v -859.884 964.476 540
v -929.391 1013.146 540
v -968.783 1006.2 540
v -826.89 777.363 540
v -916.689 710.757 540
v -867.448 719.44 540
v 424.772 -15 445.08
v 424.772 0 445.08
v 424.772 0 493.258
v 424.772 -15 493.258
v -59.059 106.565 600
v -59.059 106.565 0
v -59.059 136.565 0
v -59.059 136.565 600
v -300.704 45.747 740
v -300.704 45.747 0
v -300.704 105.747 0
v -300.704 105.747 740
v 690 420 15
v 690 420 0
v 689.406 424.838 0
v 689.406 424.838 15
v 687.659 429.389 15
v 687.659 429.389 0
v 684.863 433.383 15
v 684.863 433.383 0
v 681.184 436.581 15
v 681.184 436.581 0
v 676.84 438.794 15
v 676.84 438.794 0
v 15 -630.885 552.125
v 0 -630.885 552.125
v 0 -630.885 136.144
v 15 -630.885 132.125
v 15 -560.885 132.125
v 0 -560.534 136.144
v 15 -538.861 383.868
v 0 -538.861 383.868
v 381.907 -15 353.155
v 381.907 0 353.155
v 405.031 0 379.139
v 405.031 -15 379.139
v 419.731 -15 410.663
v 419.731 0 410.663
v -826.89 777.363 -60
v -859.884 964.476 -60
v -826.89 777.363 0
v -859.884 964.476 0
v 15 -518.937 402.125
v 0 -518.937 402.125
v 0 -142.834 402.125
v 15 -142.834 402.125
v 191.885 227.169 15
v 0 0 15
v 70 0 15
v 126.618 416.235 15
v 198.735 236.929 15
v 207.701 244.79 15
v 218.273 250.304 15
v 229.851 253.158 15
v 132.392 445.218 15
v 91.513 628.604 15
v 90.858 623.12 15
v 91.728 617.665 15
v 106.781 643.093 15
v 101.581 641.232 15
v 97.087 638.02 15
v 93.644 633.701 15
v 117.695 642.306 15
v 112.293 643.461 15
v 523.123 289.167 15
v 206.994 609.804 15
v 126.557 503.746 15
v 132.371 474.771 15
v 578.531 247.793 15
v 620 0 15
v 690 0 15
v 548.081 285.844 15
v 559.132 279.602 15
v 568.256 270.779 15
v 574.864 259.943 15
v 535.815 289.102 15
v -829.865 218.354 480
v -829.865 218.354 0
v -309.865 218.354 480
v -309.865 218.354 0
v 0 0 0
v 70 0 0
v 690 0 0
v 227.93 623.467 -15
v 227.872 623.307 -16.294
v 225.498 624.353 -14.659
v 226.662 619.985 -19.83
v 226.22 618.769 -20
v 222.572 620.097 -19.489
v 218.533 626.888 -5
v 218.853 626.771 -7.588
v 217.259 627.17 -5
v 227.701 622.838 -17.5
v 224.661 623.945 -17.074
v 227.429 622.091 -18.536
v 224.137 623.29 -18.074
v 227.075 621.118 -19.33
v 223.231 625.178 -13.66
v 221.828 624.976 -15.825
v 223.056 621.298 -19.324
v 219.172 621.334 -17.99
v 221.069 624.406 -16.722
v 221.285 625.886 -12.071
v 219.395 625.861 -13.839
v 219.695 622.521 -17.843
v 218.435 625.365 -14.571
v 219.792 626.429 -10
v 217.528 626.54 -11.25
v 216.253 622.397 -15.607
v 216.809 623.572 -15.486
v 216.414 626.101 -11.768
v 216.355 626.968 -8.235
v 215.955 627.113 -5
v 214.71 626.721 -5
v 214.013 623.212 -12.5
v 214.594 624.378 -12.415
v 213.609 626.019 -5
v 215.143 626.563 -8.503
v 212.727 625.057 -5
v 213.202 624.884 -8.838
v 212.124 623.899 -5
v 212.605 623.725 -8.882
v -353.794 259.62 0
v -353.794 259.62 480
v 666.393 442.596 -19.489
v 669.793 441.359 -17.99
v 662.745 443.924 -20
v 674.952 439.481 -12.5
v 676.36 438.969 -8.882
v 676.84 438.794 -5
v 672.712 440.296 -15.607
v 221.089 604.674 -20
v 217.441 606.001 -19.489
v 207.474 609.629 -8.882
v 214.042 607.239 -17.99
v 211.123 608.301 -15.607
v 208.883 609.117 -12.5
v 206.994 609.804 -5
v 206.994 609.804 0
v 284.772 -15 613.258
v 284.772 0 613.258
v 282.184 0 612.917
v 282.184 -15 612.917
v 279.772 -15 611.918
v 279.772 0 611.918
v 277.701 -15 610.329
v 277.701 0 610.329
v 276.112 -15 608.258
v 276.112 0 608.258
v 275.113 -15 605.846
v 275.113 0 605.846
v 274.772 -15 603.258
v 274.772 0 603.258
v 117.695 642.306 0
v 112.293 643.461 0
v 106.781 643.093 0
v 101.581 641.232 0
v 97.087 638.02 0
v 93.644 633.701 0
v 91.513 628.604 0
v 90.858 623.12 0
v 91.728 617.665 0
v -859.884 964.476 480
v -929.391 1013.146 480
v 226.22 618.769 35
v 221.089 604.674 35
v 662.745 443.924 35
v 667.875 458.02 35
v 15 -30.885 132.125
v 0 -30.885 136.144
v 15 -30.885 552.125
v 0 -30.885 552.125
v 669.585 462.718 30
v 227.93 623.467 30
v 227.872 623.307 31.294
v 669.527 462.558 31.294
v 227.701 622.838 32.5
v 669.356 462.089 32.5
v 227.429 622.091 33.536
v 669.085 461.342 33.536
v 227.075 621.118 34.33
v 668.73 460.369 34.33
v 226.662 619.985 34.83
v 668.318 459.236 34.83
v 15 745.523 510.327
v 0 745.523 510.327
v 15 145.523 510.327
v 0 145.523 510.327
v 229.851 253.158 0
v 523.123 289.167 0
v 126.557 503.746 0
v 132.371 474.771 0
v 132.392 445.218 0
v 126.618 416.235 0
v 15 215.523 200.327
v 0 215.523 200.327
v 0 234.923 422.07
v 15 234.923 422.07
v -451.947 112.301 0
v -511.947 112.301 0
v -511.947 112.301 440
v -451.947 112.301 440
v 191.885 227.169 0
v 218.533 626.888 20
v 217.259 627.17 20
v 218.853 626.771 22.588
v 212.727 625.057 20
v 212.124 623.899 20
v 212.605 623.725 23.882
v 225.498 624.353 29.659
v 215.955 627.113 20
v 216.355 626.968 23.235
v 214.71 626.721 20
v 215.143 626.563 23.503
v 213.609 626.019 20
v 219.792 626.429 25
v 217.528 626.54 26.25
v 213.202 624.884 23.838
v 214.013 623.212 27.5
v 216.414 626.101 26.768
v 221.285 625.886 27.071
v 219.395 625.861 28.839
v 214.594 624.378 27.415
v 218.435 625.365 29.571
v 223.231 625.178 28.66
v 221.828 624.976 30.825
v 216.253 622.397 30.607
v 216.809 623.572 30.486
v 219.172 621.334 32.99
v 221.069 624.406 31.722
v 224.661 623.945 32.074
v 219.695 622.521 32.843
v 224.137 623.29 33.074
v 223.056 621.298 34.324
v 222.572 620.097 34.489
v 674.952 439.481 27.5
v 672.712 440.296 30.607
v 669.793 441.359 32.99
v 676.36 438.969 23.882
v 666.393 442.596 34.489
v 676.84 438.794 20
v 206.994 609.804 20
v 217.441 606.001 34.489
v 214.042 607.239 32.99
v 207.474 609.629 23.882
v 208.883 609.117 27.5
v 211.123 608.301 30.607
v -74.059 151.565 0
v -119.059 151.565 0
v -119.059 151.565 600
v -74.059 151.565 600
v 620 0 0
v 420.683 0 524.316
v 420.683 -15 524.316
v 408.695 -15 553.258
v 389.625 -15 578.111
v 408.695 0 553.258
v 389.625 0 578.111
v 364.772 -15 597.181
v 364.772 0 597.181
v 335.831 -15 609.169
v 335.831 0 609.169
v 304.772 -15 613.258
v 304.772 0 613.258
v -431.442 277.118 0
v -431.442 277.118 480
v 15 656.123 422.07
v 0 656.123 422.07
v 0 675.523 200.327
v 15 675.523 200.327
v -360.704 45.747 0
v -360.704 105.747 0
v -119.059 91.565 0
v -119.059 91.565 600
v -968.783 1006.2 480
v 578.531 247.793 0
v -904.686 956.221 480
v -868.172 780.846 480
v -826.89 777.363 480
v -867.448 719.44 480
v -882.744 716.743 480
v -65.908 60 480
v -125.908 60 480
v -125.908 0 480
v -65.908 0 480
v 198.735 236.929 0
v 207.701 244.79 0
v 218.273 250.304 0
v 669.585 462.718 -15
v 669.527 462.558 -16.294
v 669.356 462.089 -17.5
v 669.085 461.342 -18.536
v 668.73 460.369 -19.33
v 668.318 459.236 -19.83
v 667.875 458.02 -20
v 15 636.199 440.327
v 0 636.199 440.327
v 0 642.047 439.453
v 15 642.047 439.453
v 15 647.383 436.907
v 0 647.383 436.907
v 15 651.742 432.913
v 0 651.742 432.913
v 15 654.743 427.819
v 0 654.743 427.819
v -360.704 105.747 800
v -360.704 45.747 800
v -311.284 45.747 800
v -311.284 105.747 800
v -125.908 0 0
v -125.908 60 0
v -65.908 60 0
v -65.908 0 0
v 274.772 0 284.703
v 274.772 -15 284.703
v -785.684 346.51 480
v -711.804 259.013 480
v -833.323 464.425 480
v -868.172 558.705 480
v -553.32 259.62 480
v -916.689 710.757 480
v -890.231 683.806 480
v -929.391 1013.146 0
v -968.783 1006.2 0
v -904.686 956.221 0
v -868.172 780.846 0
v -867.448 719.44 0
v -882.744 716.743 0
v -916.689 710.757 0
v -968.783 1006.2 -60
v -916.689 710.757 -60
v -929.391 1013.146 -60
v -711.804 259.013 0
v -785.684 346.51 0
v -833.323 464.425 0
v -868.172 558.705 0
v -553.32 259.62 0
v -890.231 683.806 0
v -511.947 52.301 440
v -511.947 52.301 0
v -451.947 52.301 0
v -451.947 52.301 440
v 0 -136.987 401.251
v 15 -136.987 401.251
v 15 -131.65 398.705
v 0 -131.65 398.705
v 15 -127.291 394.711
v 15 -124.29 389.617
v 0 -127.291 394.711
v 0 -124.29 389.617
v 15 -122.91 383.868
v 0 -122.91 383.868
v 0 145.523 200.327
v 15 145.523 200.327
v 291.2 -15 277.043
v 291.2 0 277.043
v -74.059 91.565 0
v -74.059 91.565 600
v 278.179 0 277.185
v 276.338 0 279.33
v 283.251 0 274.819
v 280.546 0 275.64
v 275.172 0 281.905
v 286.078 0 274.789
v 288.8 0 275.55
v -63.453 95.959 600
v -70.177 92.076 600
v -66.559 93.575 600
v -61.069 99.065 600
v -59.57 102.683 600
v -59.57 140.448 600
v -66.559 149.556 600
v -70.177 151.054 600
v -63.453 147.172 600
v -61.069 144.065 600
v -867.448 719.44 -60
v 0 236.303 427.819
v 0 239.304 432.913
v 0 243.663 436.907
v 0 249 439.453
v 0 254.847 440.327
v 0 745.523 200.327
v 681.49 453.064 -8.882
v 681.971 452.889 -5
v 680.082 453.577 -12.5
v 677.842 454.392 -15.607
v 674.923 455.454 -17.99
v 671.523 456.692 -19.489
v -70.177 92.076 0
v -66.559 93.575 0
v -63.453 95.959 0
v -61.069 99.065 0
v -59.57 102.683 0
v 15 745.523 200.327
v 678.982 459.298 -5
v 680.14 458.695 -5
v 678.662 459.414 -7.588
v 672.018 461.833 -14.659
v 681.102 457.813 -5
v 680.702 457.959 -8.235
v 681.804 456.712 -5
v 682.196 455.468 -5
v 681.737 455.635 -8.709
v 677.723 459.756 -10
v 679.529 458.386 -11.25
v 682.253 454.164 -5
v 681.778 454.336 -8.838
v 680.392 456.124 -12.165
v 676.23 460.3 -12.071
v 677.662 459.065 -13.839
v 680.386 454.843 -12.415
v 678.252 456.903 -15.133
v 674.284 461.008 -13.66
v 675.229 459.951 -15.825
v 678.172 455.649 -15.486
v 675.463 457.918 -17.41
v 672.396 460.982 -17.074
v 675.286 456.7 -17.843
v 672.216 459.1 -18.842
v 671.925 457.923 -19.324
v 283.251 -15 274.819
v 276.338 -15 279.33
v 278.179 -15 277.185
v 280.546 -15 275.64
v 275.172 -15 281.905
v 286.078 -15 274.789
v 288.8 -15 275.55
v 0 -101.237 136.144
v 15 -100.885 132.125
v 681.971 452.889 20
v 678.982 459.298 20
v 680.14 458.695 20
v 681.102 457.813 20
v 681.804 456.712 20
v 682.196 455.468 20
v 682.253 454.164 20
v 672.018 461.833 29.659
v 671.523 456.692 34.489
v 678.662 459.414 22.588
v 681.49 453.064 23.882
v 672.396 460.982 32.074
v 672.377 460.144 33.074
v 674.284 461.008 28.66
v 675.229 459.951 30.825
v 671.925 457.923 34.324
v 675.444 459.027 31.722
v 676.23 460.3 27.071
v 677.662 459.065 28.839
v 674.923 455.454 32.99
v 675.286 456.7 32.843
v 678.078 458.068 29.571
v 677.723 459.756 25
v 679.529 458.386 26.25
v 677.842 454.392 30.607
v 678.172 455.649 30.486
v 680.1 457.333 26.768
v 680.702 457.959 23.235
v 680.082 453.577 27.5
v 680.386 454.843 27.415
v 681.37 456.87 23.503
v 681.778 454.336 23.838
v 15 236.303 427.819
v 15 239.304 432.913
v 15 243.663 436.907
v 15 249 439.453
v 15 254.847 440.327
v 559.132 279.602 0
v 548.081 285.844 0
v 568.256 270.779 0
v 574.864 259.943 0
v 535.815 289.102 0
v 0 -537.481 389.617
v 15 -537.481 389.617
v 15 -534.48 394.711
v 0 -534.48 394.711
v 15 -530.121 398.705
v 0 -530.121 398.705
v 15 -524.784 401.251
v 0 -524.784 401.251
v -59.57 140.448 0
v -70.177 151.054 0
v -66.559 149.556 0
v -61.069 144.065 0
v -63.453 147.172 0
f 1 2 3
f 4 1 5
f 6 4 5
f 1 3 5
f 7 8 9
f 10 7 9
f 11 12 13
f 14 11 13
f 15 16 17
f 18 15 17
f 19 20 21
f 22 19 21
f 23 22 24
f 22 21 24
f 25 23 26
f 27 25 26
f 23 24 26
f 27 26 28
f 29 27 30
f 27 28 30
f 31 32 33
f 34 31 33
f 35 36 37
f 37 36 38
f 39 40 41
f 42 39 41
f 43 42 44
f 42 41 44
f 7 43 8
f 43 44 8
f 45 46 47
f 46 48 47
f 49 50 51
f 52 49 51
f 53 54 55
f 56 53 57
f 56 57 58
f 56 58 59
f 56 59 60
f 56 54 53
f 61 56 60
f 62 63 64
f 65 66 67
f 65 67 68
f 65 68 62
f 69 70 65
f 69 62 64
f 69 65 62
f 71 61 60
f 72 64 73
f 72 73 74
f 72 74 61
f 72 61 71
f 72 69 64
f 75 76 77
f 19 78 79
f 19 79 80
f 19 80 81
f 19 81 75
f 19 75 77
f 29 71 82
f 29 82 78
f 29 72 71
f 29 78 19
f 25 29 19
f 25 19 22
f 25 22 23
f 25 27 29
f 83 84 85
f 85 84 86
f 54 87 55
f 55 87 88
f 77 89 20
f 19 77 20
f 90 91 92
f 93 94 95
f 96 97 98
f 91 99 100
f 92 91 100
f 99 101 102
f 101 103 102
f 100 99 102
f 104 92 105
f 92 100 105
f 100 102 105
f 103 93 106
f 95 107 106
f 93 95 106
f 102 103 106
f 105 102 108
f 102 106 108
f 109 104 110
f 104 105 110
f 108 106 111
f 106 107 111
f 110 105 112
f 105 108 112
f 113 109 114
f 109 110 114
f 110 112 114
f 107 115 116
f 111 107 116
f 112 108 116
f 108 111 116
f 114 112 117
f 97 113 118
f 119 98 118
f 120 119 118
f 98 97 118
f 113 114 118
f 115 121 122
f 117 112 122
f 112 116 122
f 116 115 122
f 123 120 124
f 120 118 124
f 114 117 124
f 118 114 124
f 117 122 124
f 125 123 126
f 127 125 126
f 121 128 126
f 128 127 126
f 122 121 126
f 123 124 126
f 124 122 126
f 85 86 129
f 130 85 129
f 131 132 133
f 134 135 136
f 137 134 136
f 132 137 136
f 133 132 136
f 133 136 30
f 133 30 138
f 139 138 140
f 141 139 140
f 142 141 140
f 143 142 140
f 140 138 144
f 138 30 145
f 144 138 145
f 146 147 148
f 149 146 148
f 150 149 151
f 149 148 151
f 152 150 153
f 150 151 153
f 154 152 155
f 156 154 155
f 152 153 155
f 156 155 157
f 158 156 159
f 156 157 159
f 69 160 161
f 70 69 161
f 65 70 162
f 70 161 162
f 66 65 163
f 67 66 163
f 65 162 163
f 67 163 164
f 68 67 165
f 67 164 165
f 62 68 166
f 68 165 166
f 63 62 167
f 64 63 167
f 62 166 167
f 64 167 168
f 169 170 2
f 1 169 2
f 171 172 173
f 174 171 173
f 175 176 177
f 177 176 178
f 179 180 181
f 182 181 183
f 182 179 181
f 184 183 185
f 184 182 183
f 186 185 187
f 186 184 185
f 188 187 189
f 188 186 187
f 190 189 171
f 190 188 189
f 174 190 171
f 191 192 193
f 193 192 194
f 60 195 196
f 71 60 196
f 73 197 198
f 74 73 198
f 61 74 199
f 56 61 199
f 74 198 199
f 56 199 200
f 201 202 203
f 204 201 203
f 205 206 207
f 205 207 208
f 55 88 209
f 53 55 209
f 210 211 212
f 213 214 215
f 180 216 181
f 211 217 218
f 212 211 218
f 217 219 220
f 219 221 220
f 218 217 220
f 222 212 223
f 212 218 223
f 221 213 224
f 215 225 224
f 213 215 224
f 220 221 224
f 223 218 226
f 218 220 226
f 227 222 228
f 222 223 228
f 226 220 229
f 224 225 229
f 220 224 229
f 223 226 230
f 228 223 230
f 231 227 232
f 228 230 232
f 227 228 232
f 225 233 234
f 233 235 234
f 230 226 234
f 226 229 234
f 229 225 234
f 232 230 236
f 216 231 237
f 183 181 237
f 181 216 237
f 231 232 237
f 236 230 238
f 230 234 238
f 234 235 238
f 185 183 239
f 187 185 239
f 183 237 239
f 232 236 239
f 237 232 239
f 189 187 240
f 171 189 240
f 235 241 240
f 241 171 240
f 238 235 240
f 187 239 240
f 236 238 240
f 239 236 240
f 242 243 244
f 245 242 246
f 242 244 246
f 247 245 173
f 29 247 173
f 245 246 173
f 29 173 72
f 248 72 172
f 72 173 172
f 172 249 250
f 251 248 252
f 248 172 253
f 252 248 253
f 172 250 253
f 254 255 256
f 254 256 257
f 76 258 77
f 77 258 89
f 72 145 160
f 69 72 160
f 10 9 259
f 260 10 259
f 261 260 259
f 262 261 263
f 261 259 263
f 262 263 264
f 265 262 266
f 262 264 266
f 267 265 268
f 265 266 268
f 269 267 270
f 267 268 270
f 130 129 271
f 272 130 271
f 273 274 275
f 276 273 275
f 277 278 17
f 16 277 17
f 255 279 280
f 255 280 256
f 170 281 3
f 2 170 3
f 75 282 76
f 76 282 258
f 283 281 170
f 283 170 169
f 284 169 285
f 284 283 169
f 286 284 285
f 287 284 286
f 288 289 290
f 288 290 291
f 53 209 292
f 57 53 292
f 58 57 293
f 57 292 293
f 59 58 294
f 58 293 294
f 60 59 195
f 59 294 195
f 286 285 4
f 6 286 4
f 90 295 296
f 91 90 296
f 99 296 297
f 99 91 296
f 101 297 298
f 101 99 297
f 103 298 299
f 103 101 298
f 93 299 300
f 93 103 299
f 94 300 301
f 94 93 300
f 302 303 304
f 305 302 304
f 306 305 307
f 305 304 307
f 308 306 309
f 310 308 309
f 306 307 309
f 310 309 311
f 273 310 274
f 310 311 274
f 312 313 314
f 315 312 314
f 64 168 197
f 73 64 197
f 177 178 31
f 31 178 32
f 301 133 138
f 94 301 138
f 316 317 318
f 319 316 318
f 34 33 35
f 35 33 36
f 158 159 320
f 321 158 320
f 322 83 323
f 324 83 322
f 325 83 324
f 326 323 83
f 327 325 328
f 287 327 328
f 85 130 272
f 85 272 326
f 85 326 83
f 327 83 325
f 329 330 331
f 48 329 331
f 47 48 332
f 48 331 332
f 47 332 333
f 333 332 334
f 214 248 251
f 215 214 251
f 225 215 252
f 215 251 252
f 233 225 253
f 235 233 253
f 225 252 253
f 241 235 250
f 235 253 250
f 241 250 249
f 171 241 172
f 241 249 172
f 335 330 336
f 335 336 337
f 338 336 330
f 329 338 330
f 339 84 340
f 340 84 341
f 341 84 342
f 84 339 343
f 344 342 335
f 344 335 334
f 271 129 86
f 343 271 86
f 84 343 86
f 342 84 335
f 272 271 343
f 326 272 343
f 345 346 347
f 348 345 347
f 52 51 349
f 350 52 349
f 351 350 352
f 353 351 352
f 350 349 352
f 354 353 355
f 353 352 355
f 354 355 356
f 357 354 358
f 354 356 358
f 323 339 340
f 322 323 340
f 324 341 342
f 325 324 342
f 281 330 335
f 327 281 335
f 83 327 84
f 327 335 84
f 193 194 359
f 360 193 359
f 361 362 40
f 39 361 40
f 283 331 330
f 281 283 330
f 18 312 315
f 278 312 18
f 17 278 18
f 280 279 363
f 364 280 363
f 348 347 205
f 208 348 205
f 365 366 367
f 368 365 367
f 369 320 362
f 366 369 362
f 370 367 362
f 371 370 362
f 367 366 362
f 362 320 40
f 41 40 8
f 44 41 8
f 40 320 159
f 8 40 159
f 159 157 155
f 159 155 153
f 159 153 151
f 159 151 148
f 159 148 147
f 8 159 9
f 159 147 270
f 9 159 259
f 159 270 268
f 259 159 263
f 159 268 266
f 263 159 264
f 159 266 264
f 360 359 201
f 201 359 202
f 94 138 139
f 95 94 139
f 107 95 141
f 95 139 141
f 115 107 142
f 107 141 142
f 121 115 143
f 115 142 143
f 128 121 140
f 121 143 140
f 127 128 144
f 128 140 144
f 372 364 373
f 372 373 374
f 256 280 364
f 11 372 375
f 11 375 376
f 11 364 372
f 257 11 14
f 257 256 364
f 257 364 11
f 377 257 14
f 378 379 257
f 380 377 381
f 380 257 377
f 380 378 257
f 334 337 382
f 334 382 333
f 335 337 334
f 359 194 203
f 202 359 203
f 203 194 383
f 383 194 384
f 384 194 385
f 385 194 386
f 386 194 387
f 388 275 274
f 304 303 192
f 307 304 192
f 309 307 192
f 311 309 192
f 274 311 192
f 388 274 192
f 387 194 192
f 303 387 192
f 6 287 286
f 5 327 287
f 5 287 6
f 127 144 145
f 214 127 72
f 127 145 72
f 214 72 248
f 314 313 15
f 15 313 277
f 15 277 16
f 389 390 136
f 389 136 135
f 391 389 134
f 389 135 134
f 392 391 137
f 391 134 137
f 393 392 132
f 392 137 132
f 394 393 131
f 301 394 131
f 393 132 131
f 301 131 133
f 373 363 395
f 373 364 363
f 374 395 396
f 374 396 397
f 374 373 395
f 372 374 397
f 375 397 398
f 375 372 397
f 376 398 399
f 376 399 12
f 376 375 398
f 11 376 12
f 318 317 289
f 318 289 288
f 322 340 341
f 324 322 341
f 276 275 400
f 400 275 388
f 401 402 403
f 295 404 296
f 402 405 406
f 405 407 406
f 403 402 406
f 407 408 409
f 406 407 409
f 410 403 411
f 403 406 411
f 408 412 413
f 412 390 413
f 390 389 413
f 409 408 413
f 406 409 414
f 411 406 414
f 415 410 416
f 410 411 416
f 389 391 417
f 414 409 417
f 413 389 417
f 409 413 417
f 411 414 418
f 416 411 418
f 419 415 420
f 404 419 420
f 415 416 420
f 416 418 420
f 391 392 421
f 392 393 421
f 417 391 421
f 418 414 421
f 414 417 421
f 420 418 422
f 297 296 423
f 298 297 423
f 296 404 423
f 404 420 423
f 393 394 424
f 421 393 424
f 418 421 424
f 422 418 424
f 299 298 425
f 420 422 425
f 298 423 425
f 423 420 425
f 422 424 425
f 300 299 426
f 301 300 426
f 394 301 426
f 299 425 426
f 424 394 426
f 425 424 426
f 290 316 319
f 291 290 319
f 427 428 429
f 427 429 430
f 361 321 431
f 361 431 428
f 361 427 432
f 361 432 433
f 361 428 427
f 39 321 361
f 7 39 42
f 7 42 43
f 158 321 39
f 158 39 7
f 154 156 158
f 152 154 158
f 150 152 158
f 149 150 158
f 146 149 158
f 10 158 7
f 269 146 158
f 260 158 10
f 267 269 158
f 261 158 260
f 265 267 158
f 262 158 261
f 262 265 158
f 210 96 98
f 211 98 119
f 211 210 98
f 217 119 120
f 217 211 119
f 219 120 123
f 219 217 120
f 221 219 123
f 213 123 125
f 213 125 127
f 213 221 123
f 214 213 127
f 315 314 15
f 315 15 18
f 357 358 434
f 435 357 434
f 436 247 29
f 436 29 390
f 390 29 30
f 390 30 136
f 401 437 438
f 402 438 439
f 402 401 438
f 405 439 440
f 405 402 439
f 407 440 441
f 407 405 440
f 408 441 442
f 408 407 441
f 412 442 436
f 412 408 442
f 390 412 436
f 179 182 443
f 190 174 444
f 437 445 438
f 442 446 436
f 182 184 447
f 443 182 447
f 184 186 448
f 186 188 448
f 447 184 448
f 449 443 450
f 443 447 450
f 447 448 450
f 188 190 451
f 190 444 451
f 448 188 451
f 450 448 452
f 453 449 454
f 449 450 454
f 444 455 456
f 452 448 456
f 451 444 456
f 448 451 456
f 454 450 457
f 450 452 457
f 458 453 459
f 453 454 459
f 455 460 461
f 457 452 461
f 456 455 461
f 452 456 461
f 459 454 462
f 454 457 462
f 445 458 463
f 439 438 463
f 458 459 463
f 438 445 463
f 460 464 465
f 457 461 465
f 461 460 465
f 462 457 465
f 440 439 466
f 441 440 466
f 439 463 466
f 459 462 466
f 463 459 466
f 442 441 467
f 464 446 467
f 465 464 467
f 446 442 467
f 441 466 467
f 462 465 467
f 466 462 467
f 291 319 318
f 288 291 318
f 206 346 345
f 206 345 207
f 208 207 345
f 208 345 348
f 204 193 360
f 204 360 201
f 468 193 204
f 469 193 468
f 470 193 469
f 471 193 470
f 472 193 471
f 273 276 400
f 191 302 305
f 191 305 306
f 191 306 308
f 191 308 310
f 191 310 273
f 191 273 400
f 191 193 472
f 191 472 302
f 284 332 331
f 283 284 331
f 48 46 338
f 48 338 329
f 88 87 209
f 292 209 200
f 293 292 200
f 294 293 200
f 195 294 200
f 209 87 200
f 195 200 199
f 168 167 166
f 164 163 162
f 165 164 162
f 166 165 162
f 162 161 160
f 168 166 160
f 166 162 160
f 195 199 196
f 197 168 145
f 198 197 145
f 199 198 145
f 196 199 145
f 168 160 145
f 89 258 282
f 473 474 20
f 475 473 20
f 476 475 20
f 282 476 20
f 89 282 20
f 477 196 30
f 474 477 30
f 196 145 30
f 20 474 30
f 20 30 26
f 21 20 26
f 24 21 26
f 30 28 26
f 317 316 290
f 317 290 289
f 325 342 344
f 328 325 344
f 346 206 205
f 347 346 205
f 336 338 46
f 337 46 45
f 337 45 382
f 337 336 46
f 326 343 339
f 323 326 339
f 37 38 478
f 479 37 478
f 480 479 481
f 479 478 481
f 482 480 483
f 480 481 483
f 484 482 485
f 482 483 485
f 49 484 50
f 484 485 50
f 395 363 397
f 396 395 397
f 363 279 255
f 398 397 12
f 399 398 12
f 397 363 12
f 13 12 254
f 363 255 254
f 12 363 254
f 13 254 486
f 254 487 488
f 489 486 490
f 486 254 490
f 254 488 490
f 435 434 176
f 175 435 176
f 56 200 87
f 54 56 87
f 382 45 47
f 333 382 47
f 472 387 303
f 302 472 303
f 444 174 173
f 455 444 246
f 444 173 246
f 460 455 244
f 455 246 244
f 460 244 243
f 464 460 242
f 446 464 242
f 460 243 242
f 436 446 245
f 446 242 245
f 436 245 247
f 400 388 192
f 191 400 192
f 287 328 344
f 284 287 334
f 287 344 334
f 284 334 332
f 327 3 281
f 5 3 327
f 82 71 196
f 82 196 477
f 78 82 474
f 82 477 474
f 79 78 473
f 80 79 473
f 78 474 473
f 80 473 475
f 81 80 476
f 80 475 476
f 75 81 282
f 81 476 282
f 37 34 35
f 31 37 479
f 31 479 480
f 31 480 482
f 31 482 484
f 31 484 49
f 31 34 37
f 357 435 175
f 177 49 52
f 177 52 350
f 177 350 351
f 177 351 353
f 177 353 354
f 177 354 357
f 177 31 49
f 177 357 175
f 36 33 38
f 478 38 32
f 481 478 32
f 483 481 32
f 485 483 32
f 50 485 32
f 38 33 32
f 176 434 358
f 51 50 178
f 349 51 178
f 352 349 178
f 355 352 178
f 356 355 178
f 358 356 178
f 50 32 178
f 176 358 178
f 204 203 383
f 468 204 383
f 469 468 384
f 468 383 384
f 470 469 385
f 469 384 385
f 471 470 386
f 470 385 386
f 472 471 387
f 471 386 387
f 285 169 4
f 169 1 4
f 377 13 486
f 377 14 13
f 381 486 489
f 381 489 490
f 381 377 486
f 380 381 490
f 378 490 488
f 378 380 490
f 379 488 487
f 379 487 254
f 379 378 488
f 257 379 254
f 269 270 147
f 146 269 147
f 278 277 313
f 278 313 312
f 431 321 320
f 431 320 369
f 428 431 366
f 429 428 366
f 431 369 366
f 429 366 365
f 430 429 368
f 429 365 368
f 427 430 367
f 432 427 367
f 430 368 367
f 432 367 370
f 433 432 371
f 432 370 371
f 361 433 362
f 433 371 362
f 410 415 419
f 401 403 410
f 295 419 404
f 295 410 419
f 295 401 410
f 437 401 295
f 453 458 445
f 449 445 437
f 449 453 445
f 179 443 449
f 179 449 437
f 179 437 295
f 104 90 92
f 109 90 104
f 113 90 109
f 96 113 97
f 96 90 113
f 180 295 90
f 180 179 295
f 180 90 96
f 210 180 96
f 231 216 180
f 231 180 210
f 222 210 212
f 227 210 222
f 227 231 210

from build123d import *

# Parameters (mm, degrees)
F1_DEPTH    = 15
F3_DEPTH    = 20
F4_R        = 5
F6_DEPTH    = 600
F7_R        = 50
F9_DEPTH    = 300
F10_R       = 10
F12_DEPTH   = 15
F13_SIZE2   = 4.019228
F13_SIZE    = 14.99999
F13_2_SIZE2 = 4.019228
F13_2_SIZE  = 14.99999
F15_W       = 60
F15_H       = 60
F16_DEPTH   = 440
F17_W       = 60
F17_H       = 60
F18_DEPTH   = 800
F19_SIZE2   = 10.5796188425
F19_SIZE    = 60
F20_W       = 60
F20_H       = 60
F21_DEPTH   = 600
F23_DEPTH   = 15
F24_R       = 15
F25_W       = 60
F25_H       = 60
F26_DEPTH   = 480
F28_DEPTH   = 480
F29_W       = 300
F29_H       = 60
F30_DEPTH   = 100
F31_SIZE    = 50
F32_SIZE    = 60


# Not quite as in the source:
# - a fillet or chamfer is up to 0.001 mm smaller than in the source, because OpenCascade refuses the exact size


with BuildPart() as f1:
    # F0 (on Top) → F1 (new body)
    with BuildSketch(Plane.XY):
        with BuildLine():
            Line((126.6180717201, 416.2354741443), (0, 0))
            Line((0, 0), (70, 0))
            Line((70, 0), (191.8851607508, 227.1694949665))
            ThreePointArc((191.8851607508, 227.1694949665), (207.7011825649, 244.7896539907), (229.8505687934, 253.1575234781))
            Line((229.8505687934, 253.1575234781), (523.1229672837, 289.1668461516))
            ThreePointArc((523.1229672837, 289.1668461516), (559.1324176201, 279.6024135438), (578.5306128266, 247.7925266))
            Line((578.5306128266, 247.7925266), (620, 0))
            Line((620, 0), (690, 0))
            Line((690, 0), (690, 420))
            ThreePointArc((690, 420), (686.3830408858, 431.471528727), (676.8404028665, 438.7938524157))
            Line((676.8404028665, 438.7938524157), (117.6946363687, 642.3062680369))
            ThreePointArc((117.6946363687, 642.3062680369), (97.0871419884, 638.0199030414), (91.728138383, 617.6649815267))
            Line((91.728138383, 617.6649815267), (126.5567223416, 503.7458164876))
            ThreePointArc((126.5567223416, 503.7458164876), (133.1109720865, 459.9952186871), (126.6180717201, 416.2354741443))
        make_face()
    extrude(amount=F1_DEPTH)

    # F2 (on face) → F3 (join)
    with BuildSketch(Plane(origin=(220.2009124558, 604.9970347157, 0), x_dir=(-0.9396926208, 0.3420201433, 0), z_dir=(0.3420201433, 0.9396926208, 0))):
        with BuildLine():
            Line((-0.9455957298, 35), (-470.9455957298, 35))
            ThreePointArc((-470.9455957298, 35), (-481.5521974476, 30.6066017178), (-485.9455957298, 20))
            Line((-485.9455957298, 20), (-485.9455957298, -5))
            ThreePointArc((-485.9455957298, -5), (-481.5521974476, -15.6066017178), (-470.9455957298, -20))
            Line((-470.9455957298, -20), (-0.9455957298, -20))
            ThreePointArc((-0.9455957298, -20), (9.661005988, -15.6066017178), (14.0544042702, -5))
            Line((14.0544042702, -5), (14.0544042702, 20))
            ThreePointArc((14.0544042702, 20), (9.661005988, 30.6066017178), (-0.9455957298, 35))
        make_face()
    extrude(amount=F3_DEPTH)

    # F4
    f4_edges = [f1.edges().sort_by_distance(p)[0] for p in [
        (448.757651, 543.092741, -20),
    ]]
    fillet(f4_edges, radius=F4_R)


with BuildPart() as f6:
    # F5 (on Front) → F6 (new body)
    with BuildSketch(Plane.XZ):
        with BuildLine():
            Line((-123.4288864959, -313.8082504272), (0, -1013.8082504272))
            Line((0, -1013.8082504272), (626.6764420045, -1013.8082504272))
            ThreePointArc((626.6764420045, -1013.8082504272), (645.8275530824, -1004.8779406694), (651.2966358298, -984.4670459856))
            Line((651.2966358298, -984.4670459856), (640.3123613054, -922.1721295738))
            ThreePointArc((640.3123613054, -922.1721295738), (604.7540774342, -861.8146206111), (538.3170815047, -839.5987251324))
            Line((538.3170815047, -839.5987251324), (134.2559409884, -853.8082504272))
            Line((134.2559409884, -853.8082504272), (39.0393714058, -313.8082504272))
            Line((39.0393714058, -313.8082504272), (39.0393714058, -13.8082504272))
            Line((39.0393714058, -13.8082504272), (-123.4288864959, -13.8082504272))
            Line((-123.4288864959, -13.8082504272), (-123.4288864959, -313.8082504272))
        make_face()
    extrude(amount=F6_DEPTH)

    # F7
    f7_edges = [f6.edges().sort_by_distance(p)[0] for p in [
        (0, -300, -1013.80825),
    ]]
    fillet(f7_edges, radius=F7_R)

    # F8 (on face) → F9 (join)
    with BuildSketch(Plane.XY.offset(-13.8082504272)):
        Polygon((-123.4288864959, 0), (39.0393714058, 0), (175.9928613901, 89.3815875053), (66.5727051852, 89.3815875053), align=None)
        Polygon((175.9928613901, -689.3815875053), (39.0393714058, -600), (-123.4288864959, -600), (66.5727051852, -689.3815875053), align=None)
    extrude(amount=-F9_DEPTH)

    # F10 (call 1 of 8: OpenCascade refuses the feature's edges together)
    f10_edges = [f6.edges().sort_by_distance(p)[0] for p in [
        (175.992861, -689.381588, -163.80825),
    ]]
    fillet(f10_edges, radius=F10_R)

    # F10#2 (call 2 of 8)
    f10_2_edges = [f6.edges().sort_by_distance(p)[0] for p in [
        (175.992861, 89.381588, -163.80825),
    ]]
    fillet(f10_2_edges, radius=F10_R)

    # F10#3 (call 3 of 8)
    f10_3_edges = [f6.edges().sort_by_distance(p)[0] for p in [
        (66.572705, -689.381588, -163.80825),
    ]]
    fillet(f10_3_edges, radius=F10_R)

    # F10#4 (call 4 of 8)
    f10_4_edges = [f6.edges().sort_by_distance(p)[0] for p in [
        (-123.428886, -600, -163.80825),
    ]]
    fillet(f10_4_edges, radius=F10_R)

    # F10#5 (call 5 of 8)
    f10_5_edges = [f6.edges().sort_by_distance(p)[0] for p in [
        (66.572705, 89.381588, -163.80825),
    ]]
    fillet(f10_5_edges, radius=F10_R)

    # F10#6 (call 6 of 8)
    f10_6_edges = [f6.edges().sort_by_distance(p)[0] for p in [
        (-123.428886, 0, -163.80825),
    ]]
    fillet(f10_6_edges, radius=F10_R)

    # F10#7 (call 7 of 8)
    f10_7_edges = [f6.edges().sort_by_distance(p)[0] for p in [
        (39.039371, -600, -163.80825),
    ]]
    fillet(f10_7_edges, radius=F10_R)

    # F10#8 (call 8 of 8)
    f10_8_edges = [f6.edges().sort_by_distance(p)[0] for p in [
        (39.039371, 0, -163.80825),
    ]]
    fillet(f10_8_edges, radius=F10_R)


with BuildPart() as f12:
    # F11 (on Right) → F12 (new body)
    with BuildSketch(Plane.YZ):
        with BuildLine():
            Line((-30.8854154888, 552.1247227984), (-630.8854154888, 552.1247227984))
            Line((-630.8854154888, 552.1247227984), (-630.8854154888, 132.1247227984))
            Line((-630.8854154888, 132.1247227984), (-560.8854154888, 132.1247227984))
            Line((-560.8854154888, 132.1247227984), (-538.8607468183, 383.8678376533))
            ThreePointArc((-538.8607468183, 383.8678376533), (-532.4486570087, 396.8702695346), (-518.9368528564, 402.1247227984))
            Line((-518.9368528564, 402.1247227984), (-142.8339781211, 402.1247227984))
            ThreePointArc((-142.8339781211, 402.1247227984), (-129.3221739688, 396.8702695346), (-122.9100841593, 383.8678376533))
            Line((-122.9100841593, 383.8678376533), (-100.8854154888, 132.1247227984))
            Line((-100.8854154888, 132.1247227984), (-30.8854154888, 132.1247227984))
            Line((-30.8854154888, 132.1247227984), (-30.8854154888, 552.1247227984))
        make_face()
    extrude(amount=F12_DEPTH)

    # F13 (size 15 and 4.0192378865 in the source; OpenCascade refuses exactly that, so slightly less here)
    f13_edges = [f12.edges().sort_by_distance(p)[0] for p in [
        (0, -595.885415, 132.124723),
    ]]
    f13_side = f12.faces().sort_by_distance((7.5, -595.885415, 132.124723))[0]
    chamfer(f13_edges, length=F13_SIZE, length2=F13_SIZE2, reference=f13_side)

    # F13#2 (size 15 and 4.0192378865 in the source; OpenCascade refuses exactly that, so slightly less here)
    f13_2_edges = [f12.edges().sort_by_distance(p)[0] for p in [
        (0, -65.885415, 132.124723),
    ]]
    f13_2_side = f12.faces().sort_by_distance((7.5, -65.885415, 132.124723))[0]
    chamfer(f13_2_edges, length=F13_2_SIZE, length2=F13_2_SIZE2, reference=f13_2_side)


with BuildPart() as f12b:
    # F11 (on Right) → F12, piece 2 (new body)
    with BuildSketch(Plane.YZ):
        with BuildLine():
            Line((745.5232589184, 510.3265881046), (145.5232589184, 510.3265881046))
            Line((145.5232589184, 510.3265881046), (145.5232589184, 200.3265881046))
            Line((145.5232589184, 200.3265881046), (215.5232589184, 200.3265881046))
            Line((215.5232589184, 200.3265881046), (234.9232676831, 422.0697029596))
            ThreePointArc((234.9232676831, 422.0697029596), (241.3353574927, 435.0721348408), (254.847161645, 440.3265881046))
            Line((254.847161645, 440.3265881046), (636.1993561918, 440.3265881046))
            ThreePointArc((636.1993561918, 440.3265881046), (649.7111603441, 435.0721348408), (656.1232501537, 422.0697029596))
            Line((656.1232501537, 422.0697029596), (675.5232589184, 200.3265881046))
            Line((675.5232589184, 200.3265881046), (745.5232589184, 200.3265881046))
            Line((745.5232589184, 200.3265881046), (745.5232589184, 510.3265881046))
        make_face()
    extrude(amount=F12_DEPTH)


with BuildPart() as f16:
    # F15 (on Top) → F16 (new body)
    with BuildSketch(Plane.XY):
        with Locations((-481.9470045646, 82.3008220813)):
            Rectangle(F15_W, F15_H)
    extrude(amount=F16_DEPTH)


with BuildPart() as f18:
    # F17 (on Top) → F18 (new body)
    with BuildSketch(Plane.XY):
        with Locations((-330.7043761015, 75.7473593429)):
            Rectangle(F17_W, F17_H)
    extrude(amount=F18_DEPTH)

    # F19
    f19_edges = [f18.edges().sort_by_distance(p)[0] for p in [
        (-300.704376, 75.747359, 800),
    ]]
    f19_side = f18.faces().sort_by_distance((-300.704376, 75.747359, 400))[0]
    chamfer(f19_edges, length=F19_SIZE, length2=F19_SIZE2, reference=f19_side)


with BuildPart() as f21:
    # F20 (on Top) → F21 (new body)
    with BuildSketch(Plane.XY):
        with Locations((-89.059138, 121.5652438998)):
            Rectangle(F20_W, F20_H)
    extrude(amount=F21_DEPTH)

    # F24
    f24_edges = [f21.edges().sort_by_distance(p)[0] for p in [
        (-59.059138, 151.565244, 300),
        (-59.059138, 91.565244, 300),
    ]]
    fillet(f24_edges, radius=F24_R)


with BuildPart() as f23:
    # F22 (on Front) → F23 (new body)
    with BuildSketch(Plane.XZ):
        with BuildLine():
            Line((304.7723621194, 613.257972736), (284.7723621194, 613.257972736))
            ThreePointArc((284.7723621194, 613.257972736), (277.7012943075, 610.3290405479), (274.7723621194, 603.257972736))
            Line((274.7723621194, 603.257972736), (274.7723621194, 284.7030419411))
            ThreePointArc((274.7723621194, 284.7030419411), (280.546179502, 275.6399640708), (291.2002382162, 277.0425975099))
            Line((291.2002382162, 277.0425975099), (381.9068752817, 353.154503217))
            ThreePointArc((381.9068752817, 353.154503217), (413.5292965638, 394.3656449823), (424.7723621194, 445.0798363912))
            Line((424.7723621194, 445.0798363912), (424.7723621194, 493.257972736))
            ThreePointArc((424.7723621194, 493.257972736), (389.6251758617, 578.1107864784), (304.7723621194, 613.257972736))
        make_face()
    extrude(amount=F23_DEPTH)


with BuildPart() as f26:
    # F25 (on Top) → F26 (new body)
    with BuildSketch(Plane.XY):
        with Locations((-95.9075767291, 30)):
            Rectangle(F25_W, F25_H)
    extrude(amount=F26_DEPTH)


with BuildPart() as f28:
    # F27 (on Top) → F28 (new body)
    with BuildSketch(Plane.XY):
        Polygon((-829.8647016287, 218.3535151119), (-309.8647016287, 218.3535151119), (-353.7943065166, 259.6203386784), (-431.4419031143, 277.1183550358), (-553.3201474993, 259.6203386784), (-711.8040919304, 259.0134441853), (-785.6842875481, 346.5096950531), (-833.3225846291, 464.4245803356), (-868.1723905917, 558.7047001621), (-890.2310729027, 683.8057041168), (-868.1723905917, 780.8460277596), (-904.6863913536, 956.2211632729), (-968.7832437622, 1006.1997175217), align=None)
    extrude(amount=F28_DEPTH)

    # F29 (on face) → F30 (join)
    with BuildSketch(Plane(origin=(-767.5005687328, -135.3310579767, 0), x_dir=(0.1736481777, -0.984807753, 0), z_dir=(-0.984807753, -0.1736481777, 0))):
        with Locations((-1009.1407277276, -30)):
            Rectangle(F29_W, F29_H)
        with Locations((-1009.1407277276, 510)):
            Rectangle(F29_W, F29_H)
    extrude(amount=-F30_DEPTH)

    # F31
    f31_edges = [f28.edges().sort_by_distance(p)[0] for p in [
        (-818.208015, 728.122209, 510),
        (-818.208015, 728.122209, -30),
    ]]
    chamfer(f31_edges, length=F31_SIZE)

    # F32
    f32_edges = [f28.edges().sort_by_distance(p)[0] for p in [
        (-870.302468, 1023.564535, 510),
        (-870.302468, 1023.564535, -30),
    ]]
    chamfer(f32_edges, length=F32_SIZE)


solid = Compound([f1.part, f12.part, f12b.part, f16.part, f18.part, f21.part, f23.part, f26.part, f28.part])
